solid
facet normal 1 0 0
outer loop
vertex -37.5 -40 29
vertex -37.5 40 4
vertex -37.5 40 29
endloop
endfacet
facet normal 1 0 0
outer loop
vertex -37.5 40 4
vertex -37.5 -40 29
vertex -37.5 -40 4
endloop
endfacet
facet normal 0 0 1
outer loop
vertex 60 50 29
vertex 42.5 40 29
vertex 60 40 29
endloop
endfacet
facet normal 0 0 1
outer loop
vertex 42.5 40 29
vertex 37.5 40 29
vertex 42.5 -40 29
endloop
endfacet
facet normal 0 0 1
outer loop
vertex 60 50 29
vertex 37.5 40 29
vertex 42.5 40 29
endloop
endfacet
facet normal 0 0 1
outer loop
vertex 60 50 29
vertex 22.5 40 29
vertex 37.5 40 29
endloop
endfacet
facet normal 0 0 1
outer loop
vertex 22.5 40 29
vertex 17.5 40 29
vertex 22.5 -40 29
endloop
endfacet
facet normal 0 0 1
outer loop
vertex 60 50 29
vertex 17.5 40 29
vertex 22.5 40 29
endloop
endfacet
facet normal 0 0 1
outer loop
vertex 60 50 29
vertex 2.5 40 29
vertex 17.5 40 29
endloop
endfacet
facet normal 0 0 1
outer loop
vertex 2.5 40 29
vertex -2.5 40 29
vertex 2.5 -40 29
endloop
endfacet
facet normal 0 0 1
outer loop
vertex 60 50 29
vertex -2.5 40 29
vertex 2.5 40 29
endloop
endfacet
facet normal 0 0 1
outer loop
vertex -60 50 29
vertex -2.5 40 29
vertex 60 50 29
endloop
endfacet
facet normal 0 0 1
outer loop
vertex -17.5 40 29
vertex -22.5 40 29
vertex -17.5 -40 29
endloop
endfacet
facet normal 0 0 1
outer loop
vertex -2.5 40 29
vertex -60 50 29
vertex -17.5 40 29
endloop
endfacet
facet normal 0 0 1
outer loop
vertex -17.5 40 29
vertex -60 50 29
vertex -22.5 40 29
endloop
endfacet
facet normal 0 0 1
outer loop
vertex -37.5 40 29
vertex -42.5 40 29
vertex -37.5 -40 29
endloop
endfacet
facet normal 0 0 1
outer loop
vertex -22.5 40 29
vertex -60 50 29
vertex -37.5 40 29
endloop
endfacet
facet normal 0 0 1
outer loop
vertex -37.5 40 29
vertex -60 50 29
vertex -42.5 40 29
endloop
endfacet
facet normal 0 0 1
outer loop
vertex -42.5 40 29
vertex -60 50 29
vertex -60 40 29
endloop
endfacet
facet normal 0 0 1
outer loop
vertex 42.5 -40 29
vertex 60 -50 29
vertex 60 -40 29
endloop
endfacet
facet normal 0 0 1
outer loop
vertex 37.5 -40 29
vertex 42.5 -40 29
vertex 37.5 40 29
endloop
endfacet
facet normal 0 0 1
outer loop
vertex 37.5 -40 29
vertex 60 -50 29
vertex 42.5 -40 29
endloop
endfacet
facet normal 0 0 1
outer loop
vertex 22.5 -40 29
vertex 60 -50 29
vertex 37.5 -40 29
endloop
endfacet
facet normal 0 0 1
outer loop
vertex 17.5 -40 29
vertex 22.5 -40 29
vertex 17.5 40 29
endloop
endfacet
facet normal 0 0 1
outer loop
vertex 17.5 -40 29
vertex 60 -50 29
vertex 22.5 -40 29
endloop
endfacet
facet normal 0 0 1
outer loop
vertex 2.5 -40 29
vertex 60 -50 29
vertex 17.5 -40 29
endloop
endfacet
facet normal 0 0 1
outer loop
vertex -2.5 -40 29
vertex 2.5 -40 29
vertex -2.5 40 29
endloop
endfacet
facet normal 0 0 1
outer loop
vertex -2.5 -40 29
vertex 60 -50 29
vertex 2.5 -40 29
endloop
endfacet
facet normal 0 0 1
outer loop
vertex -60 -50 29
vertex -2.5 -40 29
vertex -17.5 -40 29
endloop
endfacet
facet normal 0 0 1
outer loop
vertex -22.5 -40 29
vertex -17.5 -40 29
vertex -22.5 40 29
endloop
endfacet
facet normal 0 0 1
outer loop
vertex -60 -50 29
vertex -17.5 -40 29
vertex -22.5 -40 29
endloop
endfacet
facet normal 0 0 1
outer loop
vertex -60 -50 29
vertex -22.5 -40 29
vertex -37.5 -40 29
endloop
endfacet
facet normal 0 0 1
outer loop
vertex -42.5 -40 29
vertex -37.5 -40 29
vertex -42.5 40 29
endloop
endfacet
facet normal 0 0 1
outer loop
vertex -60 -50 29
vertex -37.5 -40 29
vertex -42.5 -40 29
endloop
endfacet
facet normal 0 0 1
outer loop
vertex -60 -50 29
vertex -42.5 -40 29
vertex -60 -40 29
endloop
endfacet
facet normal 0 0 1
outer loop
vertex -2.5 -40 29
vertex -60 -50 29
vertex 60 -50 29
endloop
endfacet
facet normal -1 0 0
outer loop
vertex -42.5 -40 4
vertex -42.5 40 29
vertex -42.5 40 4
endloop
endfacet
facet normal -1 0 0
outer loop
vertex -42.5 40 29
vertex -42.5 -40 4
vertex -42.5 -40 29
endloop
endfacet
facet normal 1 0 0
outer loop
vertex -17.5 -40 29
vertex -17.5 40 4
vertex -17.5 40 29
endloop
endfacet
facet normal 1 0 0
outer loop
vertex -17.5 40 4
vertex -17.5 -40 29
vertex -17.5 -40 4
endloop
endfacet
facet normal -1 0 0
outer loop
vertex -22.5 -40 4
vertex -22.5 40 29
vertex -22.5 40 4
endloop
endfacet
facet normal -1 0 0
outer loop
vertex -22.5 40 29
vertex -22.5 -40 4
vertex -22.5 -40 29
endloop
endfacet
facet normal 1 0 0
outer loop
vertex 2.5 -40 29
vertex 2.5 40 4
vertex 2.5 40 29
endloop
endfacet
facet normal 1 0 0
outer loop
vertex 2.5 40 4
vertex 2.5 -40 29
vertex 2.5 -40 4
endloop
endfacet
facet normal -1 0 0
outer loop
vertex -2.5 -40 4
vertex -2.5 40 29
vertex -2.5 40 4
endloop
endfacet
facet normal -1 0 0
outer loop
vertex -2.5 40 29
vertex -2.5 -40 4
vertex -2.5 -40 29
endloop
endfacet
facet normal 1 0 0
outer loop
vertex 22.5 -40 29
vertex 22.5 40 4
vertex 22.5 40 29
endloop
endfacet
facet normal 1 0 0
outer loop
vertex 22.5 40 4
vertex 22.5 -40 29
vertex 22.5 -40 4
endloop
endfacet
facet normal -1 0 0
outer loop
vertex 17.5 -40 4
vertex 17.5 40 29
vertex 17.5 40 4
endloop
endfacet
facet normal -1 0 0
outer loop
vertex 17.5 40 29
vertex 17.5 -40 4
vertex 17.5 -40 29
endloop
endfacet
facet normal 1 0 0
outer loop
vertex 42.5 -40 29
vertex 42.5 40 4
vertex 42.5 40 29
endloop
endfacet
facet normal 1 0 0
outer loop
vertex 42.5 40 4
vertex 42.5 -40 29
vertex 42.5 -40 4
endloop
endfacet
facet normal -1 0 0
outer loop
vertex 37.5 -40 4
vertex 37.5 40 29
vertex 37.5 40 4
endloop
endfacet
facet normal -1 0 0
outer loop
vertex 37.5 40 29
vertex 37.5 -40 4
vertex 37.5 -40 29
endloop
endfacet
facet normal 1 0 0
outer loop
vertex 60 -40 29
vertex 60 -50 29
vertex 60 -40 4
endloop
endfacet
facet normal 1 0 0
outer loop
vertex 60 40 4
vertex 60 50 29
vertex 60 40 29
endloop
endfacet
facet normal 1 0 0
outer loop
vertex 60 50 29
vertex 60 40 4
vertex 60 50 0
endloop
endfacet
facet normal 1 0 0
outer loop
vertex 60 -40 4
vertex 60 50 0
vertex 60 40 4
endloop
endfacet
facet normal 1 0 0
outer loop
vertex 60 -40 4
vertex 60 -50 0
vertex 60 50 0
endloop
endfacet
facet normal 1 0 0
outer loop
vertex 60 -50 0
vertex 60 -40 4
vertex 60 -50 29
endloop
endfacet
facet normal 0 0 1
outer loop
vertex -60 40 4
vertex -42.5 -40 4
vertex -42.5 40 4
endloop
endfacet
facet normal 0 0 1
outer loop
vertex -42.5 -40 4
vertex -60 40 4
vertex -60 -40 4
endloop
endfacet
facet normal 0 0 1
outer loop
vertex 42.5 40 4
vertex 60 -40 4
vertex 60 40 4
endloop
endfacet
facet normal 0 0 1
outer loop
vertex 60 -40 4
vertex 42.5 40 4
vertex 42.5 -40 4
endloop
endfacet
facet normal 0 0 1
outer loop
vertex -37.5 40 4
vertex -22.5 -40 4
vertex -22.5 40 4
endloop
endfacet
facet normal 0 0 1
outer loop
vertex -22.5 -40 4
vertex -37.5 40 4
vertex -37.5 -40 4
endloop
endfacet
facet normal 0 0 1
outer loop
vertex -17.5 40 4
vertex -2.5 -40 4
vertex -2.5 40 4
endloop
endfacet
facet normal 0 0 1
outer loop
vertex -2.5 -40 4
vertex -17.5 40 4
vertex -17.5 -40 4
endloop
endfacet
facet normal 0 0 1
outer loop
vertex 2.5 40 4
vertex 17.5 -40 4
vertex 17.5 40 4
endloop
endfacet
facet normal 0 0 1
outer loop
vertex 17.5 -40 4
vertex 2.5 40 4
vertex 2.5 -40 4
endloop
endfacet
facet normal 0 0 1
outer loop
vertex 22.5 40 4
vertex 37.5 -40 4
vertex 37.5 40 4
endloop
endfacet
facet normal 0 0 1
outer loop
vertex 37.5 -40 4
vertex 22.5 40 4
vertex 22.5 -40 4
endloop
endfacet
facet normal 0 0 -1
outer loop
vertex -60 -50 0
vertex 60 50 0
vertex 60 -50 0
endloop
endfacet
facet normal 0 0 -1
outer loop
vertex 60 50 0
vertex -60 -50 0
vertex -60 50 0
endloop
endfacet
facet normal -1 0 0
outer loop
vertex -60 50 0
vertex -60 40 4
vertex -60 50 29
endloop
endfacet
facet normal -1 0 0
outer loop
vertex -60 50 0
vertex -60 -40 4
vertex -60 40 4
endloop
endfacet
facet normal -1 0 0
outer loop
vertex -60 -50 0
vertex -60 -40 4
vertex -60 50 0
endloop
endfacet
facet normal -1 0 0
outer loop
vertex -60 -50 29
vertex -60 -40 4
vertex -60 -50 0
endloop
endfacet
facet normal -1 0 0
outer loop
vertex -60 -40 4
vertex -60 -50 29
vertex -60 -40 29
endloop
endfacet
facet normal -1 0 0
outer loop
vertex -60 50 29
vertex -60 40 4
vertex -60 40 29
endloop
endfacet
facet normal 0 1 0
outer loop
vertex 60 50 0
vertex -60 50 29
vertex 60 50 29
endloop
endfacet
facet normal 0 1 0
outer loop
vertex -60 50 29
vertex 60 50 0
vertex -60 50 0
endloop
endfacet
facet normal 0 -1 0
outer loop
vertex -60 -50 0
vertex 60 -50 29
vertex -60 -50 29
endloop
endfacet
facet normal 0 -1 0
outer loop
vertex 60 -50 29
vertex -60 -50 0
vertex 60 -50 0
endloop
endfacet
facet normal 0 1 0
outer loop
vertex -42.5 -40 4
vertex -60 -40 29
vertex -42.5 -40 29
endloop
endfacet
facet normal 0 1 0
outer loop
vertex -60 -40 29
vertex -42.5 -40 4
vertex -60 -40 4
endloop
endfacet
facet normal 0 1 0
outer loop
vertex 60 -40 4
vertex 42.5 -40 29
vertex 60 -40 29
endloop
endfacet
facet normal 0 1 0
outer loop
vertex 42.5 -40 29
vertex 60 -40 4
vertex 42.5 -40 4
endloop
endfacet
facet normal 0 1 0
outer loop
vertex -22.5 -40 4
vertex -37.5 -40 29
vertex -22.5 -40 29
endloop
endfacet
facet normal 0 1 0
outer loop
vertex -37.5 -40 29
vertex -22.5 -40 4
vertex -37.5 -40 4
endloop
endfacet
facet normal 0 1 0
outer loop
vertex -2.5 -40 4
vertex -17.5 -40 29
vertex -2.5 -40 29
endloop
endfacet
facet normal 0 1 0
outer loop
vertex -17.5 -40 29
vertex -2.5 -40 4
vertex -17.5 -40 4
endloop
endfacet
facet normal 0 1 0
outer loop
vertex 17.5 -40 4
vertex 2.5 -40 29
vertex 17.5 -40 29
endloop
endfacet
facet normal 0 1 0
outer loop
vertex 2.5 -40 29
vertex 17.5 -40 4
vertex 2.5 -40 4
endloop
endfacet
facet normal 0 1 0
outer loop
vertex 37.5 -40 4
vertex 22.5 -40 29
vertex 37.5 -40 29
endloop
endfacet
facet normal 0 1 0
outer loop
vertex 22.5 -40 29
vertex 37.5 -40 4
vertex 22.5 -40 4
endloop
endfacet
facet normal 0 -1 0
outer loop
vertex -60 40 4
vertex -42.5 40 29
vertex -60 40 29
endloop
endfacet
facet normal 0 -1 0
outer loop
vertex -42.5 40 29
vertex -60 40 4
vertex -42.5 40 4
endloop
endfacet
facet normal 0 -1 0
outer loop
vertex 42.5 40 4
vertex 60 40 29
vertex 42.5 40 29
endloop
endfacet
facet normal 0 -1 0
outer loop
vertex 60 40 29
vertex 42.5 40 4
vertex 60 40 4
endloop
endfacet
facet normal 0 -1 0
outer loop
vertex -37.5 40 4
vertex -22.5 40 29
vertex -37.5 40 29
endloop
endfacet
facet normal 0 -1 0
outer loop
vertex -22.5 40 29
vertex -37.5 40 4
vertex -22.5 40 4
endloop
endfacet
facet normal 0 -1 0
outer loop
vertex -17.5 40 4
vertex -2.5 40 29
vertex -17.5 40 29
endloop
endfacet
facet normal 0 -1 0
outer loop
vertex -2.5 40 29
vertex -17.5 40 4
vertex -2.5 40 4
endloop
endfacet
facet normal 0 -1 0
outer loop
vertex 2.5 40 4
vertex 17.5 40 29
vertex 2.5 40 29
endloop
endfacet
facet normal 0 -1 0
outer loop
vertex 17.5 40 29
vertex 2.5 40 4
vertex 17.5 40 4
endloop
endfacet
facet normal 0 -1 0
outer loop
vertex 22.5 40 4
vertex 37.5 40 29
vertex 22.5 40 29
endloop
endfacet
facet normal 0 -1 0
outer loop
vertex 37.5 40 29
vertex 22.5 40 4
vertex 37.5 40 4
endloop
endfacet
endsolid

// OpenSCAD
$fn = 32;

// ----------------------------------------------------------------------
// Rib frame 120 x 100 x 29
// 5 ribs at 20 mm pitch
// ----------------------------------------------------------------------

// --- parameters (mm) ---
frame = [120, 100, 4];  // base plate size (x, y, z)
rail_w = 10;            // side rail width
ribs = 5;               // number of ribs
rib_t = 5;              // rib thickness
rib_h = 25;             // rib height above the base plate
pitch = 20;             // pitch between rib centres

// --- derived feature positions (mm) ---
span = (ribs - 1) * pitch;          // = 80   distance between the outer ribs
origin_x = -span / 2;               // = -40   X of the first rib
rib_len = frame[1] - 2 * rail_w + 2;  // = 82   rib length, 1 mm into each rail
feature_centers = [
  [origin_x + 0 * pitch, 0],
  [origin_x + 1 * pitch, 0],
  [origin_x + 2 * pitch, 0],
  [origin_x + 3 * pitch, 0],
  [origin_x + 4 * pitch, 0]
];   // rib centre line, drives the rib loop

// base plate, two side rails, then the ribs read straight off feature_centers
union() {
  translate([-frame[0] / 2, -frame[1] / 2, 0]) cube(frame);
  translate([-frame[0] / 2, -frame[1] / 2, 0]) cube([frame[0], rail_w, frame[2] + rib_h]);
  translate([-frame[0] / 2, frame[1] / 2 - rail_w, 0]) cube([frame[0], rail_w, frame[2] + rib_h]);
  for (centre = feature_centers)
    translate([centre[0] - rib_t / 2, centre[1] - rib_len / 2, frame[2] - 1])
      cube([rib_t, rib_len, rib_h + 1]);
}
